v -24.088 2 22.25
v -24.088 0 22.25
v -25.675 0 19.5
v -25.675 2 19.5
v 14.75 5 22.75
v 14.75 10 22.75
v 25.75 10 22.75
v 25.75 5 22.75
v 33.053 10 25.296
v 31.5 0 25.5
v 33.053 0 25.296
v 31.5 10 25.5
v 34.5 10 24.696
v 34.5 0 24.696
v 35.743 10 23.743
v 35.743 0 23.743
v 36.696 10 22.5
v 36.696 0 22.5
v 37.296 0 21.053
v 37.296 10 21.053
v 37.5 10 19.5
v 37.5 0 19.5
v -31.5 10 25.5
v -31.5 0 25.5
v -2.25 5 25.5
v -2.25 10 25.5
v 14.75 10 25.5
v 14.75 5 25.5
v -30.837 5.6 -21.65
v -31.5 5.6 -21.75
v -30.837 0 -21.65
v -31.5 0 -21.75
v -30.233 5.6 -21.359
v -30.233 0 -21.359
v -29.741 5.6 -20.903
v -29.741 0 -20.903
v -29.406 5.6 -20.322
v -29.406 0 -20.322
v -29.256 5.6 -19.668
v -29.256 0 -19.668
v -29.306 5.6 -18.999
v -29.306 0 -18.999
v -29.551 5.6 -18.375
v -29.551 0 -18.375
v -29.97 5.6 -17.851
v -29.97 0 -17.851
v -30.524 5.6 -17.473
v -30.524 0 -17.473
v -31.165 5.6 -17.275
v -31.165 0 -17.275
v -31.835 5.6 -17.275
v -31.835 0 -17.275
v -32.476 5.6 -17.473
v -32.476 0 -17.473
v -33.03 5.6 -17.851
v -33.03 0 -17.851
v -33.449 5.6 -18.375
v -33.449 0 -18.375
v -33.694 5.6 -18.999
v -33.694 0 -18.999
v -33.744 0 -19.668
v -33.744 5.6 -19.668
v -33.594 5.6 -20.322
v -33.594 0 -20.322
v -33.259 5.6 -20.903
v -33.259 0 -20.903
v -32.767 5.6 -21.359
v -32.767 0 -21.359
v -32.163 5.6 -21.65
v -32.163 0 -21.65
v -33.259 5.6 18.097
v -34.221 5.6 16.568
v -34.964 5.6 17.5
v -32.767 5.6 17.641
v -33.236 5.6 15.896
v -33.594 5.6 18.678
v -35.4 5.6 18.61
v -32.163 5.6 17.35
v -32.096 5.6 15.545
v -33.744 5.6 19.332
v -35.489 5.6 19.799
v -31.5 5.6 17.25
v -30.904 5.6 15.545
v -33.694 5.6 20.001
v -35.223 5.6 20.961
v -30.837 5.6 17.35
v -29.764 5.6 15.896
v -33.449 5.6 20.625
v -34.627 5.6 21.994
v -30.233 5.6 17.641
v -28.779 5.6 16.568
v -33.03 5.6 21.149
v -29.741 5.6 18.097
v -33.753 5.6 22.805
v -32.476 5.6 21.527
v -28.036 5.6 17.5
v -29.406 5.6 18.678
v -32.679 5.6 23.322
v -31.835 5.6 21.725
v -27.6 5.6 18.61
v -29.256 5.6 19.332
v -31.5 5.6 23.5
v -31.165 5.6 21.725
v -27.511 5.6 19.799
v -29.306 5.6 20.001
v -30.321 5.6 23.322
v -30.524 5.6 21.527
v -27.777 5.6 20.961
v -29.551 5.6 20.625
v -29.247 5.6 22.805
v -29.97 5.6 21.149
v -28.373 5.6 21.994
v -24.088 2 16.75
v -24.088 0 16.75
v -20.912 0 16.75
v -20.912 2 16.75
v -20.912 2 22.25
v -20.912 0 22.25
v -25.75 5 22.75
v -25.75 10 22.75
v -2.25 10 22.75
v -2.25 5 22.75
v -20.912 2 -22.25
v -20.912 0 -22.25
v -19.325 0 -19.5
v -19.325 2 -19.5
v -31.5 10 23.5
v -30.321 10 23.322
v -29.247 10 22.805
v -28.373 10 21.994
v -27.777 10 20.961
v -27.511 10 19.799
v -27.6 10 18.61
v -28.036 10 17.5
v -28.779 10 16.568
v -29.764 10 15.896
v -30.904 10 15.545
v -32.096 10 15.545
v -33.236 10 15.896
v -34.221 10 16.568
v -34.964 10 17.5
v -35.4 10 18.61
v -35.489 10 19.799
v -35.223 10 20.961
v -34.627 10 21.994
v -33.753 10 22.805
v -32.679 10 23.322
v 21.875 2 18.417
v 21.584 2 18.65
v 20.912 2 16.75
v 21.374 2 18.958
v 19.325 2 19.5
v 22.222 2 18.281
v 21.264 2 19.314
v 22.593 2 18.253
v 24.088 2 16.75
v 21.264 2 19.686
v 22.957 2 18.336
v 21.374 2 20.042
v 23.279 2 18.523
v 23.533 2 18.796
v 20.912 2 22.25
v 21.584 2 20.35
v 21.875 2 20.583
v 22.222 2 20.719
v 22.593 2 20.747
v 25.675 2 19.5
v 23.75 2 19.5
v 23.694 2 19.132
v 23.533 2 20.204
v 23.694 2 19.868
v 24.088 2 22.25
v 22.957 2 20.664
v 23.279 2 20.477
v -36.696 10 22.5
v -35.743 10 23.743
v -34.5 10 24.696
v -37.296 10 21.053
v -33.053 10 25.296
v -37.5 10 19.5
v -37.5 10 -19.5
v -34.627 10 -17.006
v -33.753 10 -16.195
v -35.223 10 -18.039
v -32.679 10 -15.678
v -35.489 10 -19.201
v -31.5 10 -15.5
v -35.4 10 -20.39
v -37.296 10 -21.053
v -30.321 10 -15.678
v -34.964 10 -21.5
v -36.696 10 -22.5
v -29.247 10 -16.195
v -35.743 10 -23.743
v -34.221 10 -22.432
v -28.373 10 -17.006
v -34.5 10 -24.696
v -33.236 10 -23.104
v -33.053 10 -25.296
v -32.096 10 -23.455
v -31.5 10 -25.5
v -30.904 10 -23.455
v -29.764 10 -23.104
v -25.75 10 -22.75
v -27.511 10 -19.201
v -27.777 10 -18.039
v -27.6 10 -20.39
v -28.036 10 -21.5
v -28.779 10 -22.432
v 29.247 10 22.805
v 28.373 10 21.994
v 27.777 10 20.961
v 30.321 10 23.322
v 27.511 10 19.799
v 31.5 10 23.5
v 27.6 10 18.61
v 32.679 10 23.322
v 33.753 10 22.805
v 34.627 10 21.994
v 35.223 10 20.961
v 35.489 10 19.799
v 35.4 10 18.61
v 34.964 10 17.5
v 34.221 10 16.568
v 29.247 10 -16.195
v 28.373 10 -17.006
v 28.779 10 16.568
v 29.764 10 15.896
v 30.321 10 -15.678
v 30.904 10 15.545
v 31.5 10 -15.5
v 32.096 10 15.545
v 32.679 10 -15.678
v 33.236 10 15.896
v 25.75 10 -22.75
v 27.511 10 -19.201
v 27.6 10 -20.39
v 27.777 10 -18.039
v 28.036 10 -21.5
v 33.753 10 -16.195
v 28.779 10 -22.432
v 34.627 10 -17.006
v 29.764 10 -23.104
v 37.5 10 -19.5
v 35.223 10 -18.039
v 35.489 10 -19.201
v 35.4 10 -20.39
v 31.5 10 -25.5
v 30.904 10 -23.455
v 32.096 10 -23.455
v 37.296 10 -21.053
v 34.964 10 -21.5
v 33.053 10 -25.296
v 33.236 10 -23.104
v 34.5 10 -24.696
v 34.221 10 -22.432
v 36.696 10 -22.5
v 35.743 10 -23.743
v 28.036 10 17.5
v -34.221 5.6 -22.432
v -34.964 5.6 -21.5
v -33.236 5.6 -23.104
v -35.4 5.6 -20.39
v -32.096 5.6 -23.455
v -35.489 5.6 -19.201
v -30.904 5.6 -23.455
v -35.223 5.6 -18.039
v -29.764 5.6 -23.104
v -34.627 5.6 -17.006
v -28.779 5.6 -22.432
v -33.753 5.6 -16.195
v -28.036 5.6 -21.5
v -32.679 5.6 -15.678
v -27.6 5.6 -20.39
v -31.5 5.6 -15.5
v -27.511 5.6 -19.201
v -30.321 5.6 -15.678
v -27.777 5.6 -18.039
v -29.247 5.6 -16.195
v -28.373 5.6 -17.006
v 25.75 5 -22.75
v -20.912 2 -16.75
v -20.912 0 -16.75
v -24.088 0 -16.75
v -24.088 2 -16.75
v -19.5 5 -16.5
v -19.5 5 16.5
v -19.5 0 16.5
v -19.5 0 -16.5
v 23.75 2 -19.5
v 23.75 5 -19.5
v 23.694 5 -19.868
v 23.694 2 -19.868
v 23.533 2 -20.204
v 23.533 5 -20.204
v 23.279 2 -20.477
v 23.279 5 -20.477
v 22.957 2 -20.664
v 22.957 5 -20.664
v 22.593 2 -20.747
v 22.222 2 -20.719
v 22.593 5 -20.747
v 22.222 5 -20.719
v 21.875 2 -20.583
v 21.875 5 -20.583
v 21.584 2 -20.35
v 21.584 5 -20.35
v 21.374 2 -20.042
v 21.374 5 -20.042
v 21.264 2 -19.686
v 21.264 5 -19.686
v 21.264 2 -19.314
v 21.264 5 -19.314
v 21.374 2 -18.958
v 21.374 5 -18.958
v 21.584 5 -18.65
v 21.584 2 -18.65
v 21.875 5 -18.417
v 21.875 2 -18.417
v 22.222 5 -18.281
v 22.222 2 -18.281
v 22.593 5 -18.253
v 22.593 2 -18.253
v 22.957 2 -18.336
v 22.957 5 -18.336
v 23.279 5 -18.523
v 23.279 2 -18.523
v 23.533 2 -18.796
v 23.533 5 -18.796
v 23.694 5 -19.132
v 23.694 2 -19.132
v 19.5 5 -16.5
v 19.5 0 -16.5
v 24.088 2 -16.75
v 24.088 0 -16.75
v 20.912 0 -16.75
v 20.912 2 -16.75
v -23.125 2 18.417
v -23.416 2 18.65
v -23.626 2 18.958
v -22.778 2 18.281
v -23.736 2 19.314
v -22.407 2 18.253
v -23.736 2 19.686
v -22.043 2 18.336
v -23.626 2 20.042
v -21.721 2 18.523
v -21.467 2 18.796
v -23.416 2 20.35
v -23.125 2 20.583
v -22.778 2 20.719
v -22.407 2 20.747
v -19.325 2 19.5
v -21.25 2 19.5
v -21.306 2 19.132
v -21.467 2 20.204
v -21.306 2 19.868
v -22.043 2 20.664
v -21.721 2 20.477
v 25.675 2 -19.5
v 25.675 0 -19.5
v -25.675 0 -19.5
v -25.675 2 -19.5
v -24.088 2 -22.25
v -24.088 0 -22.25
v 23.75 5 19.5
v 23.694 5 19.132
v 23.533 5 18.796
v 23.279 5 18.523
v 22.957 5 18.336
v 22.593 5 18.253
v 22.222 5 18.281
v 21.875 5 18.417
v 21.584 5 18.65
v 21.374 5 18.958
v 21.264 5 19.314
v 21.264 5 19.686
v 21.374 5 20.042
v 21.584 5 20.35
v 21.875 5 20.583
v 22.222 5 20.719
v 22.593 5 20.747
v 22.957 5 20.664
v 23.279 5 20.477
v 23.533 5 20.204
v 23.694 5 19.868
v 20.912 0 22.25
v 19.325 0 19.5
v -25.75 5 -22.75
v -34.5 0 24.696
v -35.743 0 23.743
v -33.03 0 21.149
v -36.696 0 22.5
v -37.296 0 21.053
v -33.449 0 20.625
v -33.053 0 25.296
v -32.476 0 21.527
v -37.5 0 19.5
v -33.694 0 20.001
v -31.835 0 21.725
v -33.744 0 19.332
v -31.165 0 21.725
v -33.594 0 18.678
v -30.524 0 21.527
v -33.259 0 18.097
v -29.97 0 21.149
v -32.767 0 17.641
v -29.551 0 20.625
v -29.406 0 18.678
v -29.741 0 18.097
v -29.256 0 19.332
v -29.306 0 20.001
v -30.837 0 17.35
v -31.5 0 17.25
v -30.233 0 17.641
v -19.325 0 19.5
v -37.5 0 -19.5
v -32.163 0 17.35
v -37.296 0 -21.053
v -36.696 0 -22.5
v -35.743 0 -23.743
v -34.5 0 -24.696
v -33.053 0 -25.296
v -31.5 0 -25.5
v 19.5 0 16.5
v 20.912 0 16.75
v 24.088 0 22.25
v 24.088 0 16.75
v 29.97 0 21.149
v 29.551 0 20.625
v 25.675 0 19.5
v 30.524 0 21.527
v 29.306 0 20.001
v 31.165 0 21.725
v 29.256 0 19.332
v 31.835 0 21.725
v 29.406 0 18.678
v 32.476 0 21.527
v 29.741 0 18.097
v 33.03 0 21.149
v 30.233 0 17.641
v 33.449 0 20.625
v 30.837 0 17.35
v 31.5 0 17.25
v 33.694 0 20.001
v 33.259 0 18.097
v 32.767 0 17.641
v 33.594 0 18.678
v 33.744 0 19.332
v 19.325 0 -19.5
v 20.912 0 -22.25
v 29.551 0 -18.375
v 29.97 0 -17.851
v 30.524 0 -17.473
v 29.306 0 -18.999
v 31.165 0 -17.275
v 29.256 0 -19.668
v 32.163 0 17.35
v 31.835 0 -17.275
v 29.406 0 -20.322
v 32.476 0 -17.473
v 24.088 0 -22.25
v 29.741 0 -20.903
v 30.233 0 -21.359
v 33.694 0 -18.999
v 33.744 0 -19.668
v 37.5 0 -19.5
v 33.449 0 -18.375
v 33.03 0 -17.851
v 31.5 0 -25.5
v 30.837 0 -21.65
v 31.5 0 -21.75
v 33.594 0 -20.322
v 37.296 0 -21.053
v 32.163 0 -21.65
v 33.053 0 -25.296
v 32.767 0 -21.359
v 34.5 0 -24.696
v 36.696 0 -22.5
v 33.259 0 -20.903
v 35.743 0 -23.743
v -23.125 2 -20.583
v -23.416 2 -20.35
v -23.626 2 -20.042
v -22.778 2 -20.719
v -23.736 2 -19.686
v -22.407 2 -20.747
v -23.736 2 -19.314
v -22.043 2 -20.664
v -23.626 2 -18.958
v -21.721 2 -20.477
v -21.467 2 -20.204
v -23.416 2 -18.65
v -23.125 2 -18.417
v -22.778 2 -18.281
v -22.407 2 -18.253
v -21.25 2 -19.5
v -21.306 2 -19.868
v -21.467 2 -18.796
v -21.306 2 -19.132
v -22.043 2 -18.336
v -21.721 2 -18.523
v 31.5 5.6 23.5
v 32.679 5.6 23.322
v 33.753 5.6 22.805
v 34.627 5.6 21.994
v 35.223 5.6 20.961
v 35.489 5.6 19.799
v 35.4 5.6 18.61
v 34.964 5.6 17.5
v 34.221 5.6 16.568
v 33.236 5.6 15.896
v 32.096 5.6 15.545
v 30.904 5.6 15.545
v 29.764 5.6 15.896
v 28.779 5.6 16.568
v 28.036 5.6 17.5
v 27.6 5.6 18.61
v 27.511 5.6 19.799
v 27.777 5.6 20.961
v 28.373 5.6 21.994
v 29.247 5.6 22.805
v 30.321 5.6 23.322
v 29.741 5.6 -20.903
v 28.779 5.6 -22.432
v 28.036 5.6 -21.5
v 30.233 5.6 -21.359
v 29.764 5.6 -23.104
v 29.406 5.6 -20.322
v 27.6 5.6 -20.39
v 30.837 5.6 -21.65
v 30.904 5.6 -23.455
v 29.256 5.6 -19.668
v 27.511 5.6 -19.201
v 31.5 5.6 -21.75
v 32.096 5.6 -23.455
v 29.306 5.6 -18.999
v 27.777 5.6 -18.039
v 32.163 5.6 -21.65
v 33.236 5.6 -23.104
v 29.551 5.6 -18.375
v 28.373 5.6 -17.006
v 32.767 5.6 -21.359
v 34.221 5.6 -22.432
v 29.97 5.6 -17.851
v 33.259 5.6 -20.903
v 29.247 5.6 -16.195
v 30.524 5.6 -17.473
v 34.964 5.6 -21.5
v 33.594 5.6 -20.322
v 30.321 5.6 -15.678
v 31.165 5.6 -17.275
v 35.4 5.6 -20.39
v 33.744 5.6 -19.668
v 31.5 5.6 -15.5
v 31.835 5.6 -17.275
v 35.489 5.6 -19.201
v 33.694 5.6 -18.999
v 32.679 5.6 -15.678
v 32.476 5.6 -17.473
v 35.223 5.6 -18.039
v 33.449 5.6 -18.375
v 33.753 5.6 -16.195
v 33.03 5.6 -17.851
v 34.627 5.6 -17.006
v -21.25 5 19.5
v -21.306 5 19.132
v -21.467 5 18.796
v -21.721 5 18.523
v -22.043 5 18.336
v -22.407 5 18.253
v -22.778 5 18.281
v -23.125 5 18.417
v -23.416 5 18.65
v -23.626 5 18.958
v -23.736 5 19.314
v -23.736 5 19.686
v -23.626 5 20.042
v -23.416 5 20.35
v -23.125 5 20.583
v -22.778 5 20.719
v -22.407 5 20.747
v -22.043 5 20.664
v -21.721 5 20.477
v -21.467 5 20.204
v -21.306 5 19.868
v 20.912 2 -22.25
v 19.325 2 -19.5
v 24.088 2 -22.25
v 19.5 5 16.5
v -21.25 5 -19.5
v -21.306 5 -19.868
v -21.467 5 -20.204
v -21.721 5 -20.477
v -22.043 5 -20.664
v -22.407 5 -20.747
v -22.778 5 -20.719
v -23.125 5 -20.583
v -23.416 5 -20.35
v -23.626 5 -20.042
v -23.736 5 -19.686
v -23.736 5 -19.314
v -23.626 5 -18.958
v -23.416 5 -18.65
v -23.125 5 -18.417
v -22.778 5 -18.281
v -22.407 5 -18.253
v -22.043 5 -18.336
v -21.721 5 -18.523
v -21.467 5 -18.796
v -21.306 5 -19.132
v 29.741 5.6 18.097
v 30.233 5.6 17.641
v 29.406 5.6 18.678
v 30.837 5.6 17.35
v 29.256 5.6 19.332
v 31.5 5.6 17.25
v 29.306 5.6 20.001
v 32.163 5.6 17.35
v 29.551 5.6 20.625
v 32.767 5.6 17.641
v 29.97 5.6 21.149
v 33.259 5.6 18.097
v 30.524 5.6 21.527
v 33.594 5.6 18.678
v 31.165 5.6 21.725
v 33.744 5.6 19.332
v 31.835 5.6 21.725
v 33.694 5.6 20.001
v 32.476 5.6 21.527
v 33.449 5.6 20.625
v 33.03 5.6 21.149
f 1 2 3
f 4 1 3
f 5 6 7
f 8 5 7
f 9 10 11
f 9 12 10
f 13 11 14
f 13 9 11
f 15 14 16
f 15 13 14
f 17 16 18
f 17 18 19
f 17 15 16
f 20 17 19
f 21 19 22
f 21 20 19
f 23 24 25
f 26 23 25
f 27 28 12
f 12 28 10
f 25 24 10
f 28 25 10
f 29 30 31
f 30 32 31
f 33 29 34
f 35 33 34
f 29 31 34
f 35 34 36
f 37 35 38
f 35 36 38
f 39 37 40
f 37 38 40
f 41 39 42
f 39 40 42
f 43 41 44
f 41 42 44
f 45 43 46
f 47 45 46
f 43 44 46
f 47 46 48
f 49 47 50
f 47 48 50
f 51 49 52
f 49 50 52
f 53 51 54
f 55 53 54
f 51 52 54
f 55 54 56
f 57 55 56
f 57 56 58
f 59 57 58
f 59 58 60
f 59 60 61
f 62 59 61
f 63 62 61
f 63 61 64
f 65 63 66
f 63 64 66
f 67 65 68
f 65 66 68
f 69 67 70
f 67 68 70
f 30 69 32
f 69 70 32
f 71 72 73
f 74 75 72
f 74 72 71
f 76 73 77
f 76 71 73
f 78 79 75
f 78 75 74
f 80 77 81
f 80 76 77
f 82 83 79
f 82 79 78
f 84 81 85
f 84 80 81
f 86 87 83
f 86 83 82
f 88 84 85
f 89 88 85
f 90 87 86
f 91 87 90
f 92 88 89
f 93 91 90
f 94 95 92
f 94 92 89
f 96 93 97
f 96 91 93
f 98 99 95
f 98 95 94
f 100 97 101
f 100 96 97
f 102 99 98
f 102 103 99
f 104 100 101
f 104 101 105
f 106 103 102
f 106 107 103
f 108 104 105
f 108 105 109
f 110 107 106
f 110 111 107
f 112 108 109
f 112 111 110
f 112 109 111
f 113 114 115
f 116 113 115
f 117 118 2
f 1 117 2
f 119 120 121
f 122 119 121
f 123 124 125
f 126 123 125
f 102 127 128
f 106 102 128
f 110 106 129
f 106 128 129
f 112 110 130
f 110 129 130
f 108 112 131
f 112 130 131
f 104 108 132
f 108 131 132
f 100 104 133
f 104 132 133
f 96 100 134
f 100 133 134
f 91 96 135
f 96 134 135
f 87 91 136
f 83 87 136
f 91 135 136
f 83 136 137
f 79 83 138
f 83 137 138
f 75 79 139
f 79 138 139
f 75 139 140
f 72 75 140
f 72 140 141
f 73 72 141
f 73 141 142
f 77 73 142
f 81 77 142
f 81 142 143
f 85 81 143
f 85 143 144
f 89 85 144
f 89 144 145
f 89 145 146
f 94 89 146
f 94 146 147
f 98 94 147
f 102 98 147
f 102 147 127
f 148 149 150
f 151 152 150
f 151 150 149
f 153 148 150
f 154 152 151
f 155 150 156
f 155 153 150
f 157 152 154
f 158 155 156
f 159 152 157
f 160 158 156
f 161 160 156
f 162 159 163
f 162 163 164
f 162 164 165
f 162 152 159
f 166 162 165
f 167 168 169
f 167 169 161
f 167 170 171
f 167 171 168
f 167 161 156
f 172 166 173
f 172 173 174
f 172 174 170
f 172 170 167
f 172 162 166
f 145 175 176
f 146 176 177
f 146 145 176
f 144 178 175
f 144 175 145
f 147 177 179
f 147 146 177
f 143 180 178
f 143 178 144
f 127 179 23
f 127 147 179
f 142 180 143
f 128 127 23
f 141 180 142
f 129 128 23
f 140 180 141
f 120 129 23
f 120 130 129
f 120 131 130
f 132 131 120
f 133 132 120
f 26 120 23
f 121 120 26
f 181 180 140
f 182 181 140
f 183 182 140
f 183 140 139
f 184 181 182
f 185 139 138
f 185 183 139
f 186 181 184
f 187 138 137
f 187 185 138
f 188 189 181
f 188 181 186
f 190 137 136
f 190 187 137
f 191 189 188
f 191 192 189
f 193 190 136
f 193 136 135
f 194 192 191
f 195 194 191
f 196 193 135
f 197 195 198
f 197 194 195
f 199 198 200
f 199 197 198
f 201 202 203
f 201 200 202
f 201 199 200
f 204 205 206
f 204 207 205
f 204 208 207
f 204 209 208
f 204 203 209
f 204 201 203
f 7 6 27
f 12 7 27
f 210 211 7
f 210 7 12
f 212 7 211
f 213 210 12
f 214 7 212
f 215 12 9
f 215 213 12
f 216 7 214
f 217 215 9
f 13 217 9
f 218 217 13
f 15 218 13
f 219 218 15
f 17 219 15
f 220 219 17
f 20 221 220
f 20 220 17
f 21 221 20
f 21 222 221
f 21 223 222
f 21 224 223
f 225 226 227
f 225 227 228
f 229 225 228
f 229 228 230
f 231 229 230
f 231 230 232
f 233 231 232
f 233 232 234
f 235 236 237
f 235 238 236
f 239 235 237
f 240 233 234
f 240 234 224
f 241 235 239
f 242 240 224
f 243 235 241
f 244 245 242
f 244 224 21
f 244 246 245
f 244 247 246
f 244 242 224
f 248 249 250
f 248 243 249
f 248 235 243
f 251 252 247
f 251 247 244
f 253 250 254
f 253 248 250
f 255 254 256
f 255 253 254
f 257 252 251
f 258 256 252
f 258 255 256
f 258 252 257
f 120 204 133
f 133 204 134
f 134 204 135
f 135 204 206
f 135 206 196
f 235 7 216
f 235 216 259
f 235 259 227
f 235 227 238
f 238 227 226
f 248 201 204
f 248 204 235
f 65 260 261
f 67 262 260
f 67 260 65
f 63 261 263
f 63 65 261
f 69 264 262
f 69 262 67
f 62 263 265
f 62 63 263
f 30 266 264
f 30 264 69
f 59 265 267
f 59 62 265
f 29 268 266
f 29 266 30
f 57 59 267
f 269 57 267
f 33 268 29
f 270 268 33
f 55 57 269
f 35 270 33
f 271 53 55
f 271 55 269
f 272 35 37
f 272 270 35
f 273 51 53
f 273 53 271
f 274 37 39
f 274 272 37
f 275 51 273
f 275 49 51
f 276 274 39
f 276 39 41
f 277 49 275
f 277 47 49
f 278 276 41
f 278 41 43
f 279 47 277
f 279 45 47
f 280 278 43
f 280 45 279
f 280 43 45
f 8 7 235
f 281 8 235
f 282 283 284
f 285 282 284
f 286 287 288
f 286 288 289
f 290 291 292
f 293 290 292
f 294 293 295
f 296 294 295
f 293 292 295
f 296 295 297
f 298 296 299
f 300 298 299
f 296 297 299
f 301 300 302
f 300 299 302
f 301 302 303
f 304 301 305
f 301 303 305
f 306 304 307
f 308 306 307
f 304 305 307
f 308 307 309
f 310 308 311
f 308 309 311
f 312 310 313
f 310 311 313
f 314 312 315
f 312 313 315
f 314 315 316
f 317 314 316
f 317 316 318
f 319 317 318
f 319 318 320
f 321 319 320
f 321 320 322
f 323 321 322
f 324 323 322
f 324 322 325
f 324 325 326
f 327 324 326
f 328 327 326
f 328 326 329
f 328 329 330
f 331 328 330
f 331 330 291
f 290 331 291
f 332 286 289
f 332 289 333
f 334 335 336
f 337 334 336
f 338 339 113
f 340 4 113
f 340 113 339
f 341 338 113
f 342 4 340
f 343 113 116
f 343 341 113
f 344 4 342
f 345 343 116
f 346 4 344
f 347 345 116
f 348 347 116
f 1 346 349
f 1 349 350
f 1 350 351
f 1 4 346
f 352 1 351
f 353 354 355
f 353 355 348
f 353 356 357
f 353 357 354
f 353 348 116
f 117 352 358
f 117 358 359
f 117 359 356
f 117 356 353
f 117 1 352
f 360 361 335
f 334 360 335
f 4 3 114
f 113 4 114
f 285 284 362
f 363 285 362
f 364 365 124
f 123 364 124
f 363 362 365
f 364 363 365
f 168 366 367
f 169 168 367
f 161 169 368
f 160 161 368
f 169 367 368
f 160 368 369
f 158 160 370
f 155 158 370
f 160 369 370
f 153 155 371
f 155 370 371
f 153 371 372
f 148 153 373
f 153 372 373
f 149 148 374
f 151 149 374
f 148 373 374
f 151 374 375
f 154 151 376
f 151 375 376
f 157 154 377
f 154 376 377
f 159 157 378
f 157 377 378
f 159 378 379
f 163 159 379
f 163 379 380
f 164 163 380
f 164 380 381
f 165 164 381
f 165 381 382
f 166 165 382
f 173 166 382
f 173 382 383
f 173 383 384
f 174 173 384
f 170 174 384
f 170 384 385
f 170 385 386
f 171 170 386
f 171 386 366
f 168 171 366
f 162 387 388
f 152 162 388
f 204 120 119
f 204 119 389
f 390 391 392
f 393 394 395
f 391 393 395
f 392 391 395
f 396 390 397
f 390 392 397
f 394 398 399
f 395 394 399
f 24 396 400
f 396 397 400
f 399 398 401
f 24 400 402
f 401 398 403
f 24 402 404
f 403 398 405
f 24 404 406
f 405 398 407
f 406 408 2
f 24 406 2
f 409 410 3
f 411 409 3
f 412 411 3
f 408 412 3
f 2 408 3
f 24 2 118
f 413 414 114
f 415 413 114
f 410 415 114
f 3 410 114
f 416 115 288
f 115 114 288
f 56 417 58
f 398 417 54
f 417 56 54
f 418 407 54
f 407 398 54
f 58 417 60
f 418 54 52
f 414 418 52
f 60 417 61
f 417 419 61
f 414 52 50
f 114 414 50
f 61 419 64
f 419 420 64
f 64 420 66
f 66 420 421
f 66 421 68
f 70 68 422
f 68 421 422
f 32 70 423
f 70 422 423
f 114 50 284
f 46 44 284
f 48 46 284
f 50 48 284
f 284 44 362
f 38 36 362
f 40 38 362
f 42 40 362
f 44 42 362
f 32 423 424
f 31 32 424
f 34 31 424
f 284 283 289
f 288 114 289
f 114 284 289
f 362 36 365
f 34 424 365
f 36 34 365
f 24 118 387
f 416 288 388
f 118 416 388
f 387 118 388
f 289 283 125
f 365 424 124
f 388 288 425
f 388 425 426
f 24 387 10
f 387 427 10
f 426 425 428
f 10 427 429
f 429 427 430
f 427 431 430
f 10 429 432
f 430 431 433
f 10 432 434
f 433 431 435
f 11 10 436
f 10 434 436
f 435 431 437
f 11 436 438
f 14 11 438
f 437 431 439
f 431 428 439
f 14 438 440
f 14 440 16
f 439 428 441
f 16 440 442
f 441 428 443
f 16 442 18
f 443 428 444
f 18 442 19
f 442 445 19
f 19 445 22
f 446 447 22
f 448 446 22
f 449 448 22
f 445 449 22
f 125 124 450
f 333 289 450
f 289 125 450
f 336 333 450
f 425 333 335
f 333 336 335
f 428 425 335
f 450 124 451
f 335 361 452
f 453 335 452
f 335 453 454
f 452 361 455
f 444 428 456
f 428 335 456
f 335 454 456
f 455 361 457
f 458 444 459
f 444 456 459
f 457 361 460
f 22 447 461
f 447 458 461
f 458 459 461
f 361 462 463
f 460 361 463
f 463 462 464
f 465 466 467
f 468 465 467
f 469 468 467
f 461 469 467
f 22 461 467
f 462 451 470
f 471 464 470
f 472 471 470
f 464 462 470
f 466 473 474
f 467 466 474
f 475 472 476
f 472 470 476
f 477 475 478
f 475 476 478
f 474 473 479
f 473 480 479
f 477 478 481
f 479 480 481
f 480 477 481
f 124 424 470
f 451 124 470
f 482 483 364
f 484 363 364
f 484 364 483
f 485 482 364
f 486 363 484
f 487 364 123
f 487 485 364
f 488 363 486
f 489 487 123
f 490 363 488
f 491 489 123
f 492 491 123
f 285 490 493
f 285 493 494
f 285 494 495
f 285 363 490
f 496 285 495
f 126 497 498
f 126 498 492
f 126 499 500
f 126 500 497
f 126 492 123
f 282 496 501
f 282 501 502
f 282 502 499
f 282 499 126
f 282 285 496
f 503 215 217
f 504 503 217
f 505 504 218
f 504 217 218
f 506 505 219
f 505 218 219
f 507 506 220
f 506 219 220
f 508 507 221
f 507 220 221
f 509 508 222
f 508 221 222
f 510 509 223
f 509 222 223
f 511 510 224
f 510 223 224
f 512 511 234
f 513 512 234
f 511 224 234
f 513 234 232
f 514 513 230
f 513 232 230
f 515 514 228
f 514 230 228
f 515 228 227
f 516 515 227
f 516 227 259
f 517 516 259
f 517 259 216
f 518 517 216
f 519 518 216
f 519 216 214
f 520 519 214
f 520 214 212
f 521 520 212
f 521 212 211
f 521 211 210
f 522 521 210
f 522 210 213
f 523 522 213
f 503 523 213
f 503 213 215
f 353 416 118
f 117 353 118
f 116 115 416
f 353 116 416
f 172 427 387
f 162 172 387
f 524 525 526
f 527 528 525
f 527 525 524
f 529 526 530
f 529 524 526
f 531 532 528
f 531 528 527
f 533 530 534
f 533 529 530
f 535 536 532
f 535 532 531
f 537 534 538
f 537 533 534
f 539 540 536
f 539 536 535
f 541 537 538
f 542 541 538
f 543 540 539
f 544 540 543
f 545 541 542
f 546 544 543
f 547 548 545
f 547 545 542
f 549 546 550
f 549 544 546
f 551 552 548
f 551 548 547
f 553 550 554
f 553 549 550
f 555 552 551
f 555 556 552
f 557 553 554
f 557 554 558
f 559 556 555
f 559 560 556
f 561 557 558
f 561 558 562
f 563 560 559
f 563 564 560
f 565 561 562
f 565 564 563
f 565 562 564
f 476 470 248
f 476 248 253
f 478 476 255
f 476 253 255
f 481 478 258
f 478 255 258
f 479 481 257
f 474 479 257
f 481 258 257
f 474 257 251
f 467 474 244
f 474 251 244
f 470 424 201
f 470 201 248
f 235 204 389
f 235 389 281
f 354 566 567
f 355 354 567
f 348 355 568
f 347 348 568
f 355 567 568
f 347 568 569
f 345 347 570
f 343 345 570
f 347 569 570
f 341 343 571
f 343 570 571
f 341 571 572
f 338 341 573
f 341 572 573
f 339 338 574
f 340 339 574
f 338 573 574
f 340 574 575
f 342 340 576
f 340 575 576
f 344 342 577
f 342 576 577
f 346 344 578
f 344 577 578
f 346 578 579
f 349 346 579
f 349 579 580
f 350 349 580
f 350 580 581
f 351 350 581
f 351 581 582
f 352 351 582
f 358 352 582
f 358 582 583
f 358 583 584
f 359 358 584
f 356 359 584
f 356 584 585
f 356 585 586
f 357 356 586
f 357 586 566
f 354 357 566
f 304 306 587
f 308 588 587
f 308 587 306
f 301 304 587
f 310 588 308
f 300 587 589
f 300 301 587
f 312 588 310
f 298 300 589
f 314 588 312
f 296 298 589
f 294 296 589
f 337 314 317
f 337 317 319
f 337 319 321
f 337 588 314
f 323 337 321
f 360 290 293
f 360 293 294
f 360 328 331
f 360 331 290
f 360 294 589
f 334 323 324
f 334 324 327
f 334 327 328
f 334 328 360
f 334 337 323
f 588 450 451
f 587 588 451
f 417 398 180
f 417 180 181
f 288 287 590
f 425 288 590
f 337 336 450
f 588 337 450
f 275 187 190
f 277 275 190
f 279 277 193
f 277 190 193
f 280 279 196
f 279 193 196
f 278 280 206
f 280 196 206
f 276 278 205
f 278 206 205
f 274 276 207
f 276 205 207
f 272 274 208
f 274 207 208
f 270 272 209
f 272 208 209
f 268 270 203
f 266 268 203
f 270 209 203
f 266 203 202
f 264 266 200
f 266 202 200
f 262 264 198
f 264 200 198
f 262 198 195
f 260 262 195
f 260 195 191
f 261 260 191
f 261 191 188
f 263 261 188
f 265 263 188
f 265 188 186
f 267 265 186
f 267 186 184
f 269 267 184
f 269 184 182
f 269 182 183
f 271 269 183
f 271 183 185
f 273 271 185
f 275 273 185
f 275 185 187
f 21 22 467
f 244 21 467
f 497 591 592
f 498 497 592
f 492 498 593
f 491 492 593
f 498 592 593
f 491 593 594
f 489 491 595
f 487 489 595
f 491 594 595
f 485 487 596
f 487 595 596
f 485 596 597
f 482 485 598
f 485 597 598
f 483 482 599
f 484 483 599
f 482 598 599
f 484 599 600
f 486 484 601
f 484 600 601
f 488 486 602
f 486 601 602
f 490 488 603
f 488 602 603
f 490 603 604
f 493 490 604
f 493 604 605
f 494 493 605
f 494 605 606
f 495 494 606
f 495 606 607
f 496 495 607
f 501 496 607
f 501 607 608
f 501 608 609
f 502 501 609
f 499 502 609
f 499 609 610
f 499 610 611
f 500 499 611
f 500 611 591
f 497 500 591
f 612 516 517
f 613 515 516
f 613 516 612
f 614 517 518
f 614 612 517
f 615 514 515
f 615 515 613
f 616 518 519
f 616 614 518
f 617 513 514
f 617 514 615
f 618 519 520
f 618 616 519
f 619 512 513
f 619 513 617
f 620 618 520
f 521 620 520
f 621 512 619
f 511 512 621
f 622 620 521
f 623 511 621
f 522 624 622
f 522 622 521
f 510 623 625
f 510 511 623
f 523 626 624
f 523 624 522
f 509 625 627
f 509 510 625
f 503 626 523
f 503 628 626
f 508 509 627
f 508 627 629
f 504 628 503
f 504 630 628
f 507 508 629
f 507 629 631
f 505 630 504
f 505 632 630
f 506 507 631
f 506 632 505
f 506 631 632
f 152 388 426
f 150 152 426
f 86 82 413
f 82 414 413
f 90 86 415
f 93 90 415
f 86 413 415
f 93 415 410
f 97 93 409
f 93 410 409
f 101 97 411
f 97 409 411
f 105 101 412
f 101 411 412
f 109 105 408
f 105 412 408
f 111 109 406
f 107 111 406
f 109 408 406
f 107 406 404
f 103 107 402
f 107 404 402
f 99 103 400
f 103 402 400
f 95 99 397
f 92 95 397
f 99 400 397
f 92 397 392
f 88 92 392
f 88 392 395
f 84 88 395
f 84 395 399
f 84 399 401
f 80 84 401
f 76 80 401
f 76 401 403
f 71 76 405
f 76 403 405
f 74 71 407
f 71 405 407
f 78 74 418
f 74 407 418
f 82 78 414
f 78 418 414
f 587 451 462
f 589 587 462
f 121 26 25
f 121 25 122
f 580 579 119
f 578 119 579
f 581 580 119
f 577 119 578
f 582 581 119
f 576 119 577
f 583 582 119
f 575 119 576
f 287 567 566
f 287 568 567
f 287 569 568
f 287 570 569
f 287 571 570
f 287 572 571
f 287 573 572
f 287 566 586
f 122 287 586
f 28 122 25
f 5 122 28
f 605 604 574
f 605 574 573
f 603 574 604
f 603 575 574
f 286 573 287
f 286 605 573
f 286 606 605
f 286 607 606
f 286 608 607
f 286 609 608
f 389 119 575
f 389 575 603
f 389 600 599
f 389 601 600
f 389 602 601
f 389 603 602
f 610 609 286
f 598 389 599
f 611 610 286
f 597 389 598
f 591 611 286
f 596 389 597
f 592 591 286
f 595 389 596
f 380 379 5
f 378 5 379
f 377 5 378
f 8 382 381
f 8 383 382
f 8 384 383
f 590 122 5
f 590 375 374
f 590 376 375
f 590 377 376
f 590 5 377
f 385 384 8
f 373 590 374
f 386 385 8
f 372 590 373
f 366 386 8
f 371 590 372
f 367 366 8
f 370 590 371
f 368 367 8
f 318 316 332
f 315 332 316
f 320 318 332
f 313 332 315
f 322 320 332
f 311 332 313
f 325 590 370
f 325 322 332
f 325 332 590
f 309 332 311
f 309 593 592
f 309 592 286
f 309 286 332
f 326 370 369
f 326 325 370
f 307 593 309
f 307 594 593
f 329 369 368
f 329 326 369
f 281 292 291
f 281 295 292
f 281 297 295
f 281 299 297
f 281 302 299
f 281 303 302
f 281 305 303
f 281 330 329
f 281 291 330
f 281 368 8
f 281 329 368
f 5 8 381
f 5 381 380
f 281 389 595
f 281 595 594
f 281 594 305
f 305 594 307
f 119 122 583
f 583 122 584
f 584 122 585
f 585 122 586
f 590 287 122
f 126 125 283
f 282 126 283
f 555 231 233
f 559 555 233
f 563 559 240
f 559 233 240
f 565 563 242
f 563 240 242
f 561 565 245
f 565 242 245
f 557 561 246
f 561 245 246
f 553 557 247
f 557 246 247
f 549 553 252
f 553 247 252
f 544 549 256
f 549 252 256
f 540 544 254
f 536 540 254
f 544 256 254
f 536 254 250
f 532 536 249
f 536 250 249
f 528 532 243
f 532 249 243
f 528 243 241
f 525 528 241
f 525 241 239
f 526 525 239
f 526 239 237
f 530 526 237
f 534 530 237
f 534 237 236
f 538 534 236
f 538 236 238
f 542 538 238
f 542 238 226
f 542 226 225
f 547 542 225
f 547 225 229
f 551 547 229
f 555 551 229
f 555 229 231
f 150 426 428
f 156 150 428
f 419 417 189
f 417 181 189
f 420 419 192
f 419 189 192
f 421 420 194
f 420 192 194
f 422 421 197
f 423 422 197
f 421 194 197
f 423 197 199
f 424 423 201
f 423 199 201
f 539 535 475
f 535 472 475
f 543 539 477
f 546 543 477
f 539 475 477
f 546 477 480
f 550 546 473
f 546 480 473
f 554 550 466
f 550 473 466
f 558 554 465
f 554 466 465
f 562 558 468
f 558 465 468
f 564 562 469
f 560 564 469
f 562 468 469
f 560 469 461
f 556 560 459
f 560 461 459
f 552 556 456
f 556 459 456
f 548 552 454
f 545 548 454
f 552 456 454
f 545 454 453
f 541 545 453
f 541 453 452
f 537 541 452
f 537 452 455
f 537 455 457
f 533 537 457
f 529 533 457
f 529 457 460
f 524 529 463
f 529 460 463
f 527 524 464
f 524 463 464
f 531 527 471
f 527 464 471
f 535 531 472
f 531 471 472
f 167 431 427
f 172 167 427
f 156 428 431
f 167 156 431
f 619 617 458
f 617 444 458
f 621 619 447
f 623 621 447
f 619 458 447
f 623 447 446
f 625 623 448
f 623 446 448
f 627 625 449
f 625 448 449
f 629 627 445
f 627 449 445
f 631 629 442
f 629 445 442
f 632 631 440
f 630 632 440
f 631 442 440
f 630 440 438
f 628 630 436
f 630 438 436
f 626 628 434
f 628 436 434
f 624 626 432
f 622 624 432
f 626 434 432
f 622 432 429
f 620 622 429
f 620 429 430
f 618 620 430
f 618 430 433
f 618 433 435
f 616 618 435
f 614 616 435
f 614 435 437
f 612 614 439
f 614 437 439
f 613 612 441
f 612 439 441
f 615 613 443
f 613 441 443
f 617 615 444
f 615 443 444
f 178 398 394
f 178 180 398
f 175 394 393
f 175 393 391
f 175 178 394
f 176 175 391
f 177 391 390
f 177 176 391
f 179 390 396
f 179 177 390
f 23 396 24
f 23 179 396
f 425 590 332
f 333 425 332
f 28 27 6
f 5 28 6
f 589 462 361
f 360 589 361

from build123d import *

# Parameters (mm, degrees)
SKETCH_1_W                   = 75
SKETCH_1_H                   = 51
EXTRUDE_1_DEPTH              = 10
SKETCH_2_W                   = 51.5
SKETCH_2_H                   = 45.5
CUT_EXTRUDE_1_DEPTH          = 5
SKETCH_3_R                   = 1.25
CUT_EXTRUDE_2_DEPTH          = 5
CUT_EXTRUDE_3_REACH          = 7
SKETCH_4_W                   = 39
SKETCH_4_H                   = 33
FILLET_1_R                   = 6
CUT_EXTRUDE_4_DEPTH          = 2
HOLE_WIZARD_M4_1_D           = 4.5
HOLE_WIZARD_M4_1_CBORE_D     = 8
HOLE_WIZARD_M4_1_CBORE_DEPTH = 4.4
SKETCH_7_W                   = 17
SKETCH_7_H                   = 2.75
CUT_EXTRUDE_5_DEPTH          = 5


with BuildPart() as part:
    # 草图1 → 凸台-拉伸1 (new body)
    with BuildSketch(Plane(origin=(0, 0, 0), x_dir=(1, 0, 0), z_dir=(0, 1, 0))):
        Rectangle(SKETCH_1_W, SKETCH_1_H)
    extrude(amount=EXTRUDE_1_DEPTH)

    # 草图2 → 切除-拉伸1 (cut)
    with BuildSketch(Plane(origin=(0, 10, 0), x_dir=(1, 0, 0), z_dir=(0, 1, 0))):
        Rectangle(SKETCH_2_W, SKETCH_2_H)
    extrude(amount=-CUT_EXTRUDE_1_DEPTH, mode=Mode.SUBTRACT)

    # 草图3 → 切除-拉伸2 (cut)
    with BuildSketch(Plane(origin=(0, 5, 0), x_dir=(1, 0, 0), z_dir=(0, 1, 0))):
        with Locations((-22.5, 19.5)):
            Circle(SKETCH_3_R)
        with Locations((-22.5, -19.5)):
            Circle(SKETCH_3_R)
        with Locations((22.5, -19.5)):
            Circle(SKETCH_3_R)
        with Locations((22.5, 19.5)):
            Circle(SKETCH_3_R)
    extrude(amount=-CUT_EXTRUDE_2_DEPTH, mode=Mode.SUBTRACT)

    # 草图4 → 切除-拉伸3 (cut, up to next)
    with BuildSketch(Plane(origin=(0, 5, 0), x_dir=(1, 0, 0), z_dir=(0, 1, 0)), mode=Mode.PRIVATE) as cut_extrude_3_sk1:
        Rectangle(SKETCH_4_W, SKETCH_4_H)
    cut_extrude_3_tool1 = extrude(cut_extrude_3_sk1.sketch, amount=-CUT_EXTRUDE_3_REACH, mode=Mode.PRIVATE) & part.part
    add(cut_extrude_3_tool1.solids().sort_by_distance((0, 5, 0))[0], mode=Mode.SUBTRACT)

    # 圆角1
    fillet_1_edges = [part.edges().sort_by_distance(p)[0] for p in [
        (37.5, 5, 25.5),
        (-37.5, 5, 25.5),
        (-37.5, 5, -25.5),
        (37.5, 5, -25.5),
    ]]
    fillet(fillet_1_edges, radius=FILLET_1_R)

    # 草图5 → 切除-拉伸4 (cut)
    with BuildSketch(Plane.XZ):
        Polygon((-19.324573519, 19.5), (-20.91228676, 22.25), (-24.08771324, 22.25), (-25.675426481, 19.5), (-24.08771324, 16.75), (-20.91228676, 16.75), align=None)
        Polygon((25.675426481, 19.5), (24.08771324, 22.25), (20.91228676, 22.25), (19.324573519, 19.5), (20.91228676, 16.75), (24.08771324, 16.75), align=None)
        Polygon((-19.324573519, -19.5), (-20.91228676, -16.75), (-24.08771324, -16.75), (-25.675426481, -19.5), (-24.08771324, -22.25), (-20.91228676, -22.25), align=None)
        Polygon((25.675426481, -19.5), (24.08771324, -16.75), (20.91228676, -16.75), (19.324573519, -19.5), (20.91228676, -22.25), (24.08771324, -22.25), align=None)
    extrude(amount=-CUT_EXTRUDE_4_DEPTH, mode=Mode.SUBTRACT)

    # M4 六角凹头螺钉的柱形沉头孔1 (through all)
    with Locations(Plane(origin=(31.5, 10, 19.5), x_dir=(0, 0, 1), z_dir=(0, 1, 0))):
        with Locations((0, 0), (-39, 0), (-39, -63), (0, -63)):
            CounterBoreHole(HOLE_WIZARD_M4_1_D / 2, HOLE_WIZARD_M4_1_CBORE_D / 2, HOLE_WIZARD_M4_1_CBORE_DEPTH)

    # 草图7 → 切除-拉伸5 (cut)
    with BuildSketch(Plane(origin=(0, 10, 0), x_dir=(1, 0, 0), z_dir=(0, 1, 0))):
        with Locations((6.25, -24.125)):
            Rectangle(SKETCH_7_W, SKETCH_7_H)
    extrude(amount=-CUT_EXTRUDE_5_DEPTH, mode=Mode.SUBTRACT)


solid = part.part
